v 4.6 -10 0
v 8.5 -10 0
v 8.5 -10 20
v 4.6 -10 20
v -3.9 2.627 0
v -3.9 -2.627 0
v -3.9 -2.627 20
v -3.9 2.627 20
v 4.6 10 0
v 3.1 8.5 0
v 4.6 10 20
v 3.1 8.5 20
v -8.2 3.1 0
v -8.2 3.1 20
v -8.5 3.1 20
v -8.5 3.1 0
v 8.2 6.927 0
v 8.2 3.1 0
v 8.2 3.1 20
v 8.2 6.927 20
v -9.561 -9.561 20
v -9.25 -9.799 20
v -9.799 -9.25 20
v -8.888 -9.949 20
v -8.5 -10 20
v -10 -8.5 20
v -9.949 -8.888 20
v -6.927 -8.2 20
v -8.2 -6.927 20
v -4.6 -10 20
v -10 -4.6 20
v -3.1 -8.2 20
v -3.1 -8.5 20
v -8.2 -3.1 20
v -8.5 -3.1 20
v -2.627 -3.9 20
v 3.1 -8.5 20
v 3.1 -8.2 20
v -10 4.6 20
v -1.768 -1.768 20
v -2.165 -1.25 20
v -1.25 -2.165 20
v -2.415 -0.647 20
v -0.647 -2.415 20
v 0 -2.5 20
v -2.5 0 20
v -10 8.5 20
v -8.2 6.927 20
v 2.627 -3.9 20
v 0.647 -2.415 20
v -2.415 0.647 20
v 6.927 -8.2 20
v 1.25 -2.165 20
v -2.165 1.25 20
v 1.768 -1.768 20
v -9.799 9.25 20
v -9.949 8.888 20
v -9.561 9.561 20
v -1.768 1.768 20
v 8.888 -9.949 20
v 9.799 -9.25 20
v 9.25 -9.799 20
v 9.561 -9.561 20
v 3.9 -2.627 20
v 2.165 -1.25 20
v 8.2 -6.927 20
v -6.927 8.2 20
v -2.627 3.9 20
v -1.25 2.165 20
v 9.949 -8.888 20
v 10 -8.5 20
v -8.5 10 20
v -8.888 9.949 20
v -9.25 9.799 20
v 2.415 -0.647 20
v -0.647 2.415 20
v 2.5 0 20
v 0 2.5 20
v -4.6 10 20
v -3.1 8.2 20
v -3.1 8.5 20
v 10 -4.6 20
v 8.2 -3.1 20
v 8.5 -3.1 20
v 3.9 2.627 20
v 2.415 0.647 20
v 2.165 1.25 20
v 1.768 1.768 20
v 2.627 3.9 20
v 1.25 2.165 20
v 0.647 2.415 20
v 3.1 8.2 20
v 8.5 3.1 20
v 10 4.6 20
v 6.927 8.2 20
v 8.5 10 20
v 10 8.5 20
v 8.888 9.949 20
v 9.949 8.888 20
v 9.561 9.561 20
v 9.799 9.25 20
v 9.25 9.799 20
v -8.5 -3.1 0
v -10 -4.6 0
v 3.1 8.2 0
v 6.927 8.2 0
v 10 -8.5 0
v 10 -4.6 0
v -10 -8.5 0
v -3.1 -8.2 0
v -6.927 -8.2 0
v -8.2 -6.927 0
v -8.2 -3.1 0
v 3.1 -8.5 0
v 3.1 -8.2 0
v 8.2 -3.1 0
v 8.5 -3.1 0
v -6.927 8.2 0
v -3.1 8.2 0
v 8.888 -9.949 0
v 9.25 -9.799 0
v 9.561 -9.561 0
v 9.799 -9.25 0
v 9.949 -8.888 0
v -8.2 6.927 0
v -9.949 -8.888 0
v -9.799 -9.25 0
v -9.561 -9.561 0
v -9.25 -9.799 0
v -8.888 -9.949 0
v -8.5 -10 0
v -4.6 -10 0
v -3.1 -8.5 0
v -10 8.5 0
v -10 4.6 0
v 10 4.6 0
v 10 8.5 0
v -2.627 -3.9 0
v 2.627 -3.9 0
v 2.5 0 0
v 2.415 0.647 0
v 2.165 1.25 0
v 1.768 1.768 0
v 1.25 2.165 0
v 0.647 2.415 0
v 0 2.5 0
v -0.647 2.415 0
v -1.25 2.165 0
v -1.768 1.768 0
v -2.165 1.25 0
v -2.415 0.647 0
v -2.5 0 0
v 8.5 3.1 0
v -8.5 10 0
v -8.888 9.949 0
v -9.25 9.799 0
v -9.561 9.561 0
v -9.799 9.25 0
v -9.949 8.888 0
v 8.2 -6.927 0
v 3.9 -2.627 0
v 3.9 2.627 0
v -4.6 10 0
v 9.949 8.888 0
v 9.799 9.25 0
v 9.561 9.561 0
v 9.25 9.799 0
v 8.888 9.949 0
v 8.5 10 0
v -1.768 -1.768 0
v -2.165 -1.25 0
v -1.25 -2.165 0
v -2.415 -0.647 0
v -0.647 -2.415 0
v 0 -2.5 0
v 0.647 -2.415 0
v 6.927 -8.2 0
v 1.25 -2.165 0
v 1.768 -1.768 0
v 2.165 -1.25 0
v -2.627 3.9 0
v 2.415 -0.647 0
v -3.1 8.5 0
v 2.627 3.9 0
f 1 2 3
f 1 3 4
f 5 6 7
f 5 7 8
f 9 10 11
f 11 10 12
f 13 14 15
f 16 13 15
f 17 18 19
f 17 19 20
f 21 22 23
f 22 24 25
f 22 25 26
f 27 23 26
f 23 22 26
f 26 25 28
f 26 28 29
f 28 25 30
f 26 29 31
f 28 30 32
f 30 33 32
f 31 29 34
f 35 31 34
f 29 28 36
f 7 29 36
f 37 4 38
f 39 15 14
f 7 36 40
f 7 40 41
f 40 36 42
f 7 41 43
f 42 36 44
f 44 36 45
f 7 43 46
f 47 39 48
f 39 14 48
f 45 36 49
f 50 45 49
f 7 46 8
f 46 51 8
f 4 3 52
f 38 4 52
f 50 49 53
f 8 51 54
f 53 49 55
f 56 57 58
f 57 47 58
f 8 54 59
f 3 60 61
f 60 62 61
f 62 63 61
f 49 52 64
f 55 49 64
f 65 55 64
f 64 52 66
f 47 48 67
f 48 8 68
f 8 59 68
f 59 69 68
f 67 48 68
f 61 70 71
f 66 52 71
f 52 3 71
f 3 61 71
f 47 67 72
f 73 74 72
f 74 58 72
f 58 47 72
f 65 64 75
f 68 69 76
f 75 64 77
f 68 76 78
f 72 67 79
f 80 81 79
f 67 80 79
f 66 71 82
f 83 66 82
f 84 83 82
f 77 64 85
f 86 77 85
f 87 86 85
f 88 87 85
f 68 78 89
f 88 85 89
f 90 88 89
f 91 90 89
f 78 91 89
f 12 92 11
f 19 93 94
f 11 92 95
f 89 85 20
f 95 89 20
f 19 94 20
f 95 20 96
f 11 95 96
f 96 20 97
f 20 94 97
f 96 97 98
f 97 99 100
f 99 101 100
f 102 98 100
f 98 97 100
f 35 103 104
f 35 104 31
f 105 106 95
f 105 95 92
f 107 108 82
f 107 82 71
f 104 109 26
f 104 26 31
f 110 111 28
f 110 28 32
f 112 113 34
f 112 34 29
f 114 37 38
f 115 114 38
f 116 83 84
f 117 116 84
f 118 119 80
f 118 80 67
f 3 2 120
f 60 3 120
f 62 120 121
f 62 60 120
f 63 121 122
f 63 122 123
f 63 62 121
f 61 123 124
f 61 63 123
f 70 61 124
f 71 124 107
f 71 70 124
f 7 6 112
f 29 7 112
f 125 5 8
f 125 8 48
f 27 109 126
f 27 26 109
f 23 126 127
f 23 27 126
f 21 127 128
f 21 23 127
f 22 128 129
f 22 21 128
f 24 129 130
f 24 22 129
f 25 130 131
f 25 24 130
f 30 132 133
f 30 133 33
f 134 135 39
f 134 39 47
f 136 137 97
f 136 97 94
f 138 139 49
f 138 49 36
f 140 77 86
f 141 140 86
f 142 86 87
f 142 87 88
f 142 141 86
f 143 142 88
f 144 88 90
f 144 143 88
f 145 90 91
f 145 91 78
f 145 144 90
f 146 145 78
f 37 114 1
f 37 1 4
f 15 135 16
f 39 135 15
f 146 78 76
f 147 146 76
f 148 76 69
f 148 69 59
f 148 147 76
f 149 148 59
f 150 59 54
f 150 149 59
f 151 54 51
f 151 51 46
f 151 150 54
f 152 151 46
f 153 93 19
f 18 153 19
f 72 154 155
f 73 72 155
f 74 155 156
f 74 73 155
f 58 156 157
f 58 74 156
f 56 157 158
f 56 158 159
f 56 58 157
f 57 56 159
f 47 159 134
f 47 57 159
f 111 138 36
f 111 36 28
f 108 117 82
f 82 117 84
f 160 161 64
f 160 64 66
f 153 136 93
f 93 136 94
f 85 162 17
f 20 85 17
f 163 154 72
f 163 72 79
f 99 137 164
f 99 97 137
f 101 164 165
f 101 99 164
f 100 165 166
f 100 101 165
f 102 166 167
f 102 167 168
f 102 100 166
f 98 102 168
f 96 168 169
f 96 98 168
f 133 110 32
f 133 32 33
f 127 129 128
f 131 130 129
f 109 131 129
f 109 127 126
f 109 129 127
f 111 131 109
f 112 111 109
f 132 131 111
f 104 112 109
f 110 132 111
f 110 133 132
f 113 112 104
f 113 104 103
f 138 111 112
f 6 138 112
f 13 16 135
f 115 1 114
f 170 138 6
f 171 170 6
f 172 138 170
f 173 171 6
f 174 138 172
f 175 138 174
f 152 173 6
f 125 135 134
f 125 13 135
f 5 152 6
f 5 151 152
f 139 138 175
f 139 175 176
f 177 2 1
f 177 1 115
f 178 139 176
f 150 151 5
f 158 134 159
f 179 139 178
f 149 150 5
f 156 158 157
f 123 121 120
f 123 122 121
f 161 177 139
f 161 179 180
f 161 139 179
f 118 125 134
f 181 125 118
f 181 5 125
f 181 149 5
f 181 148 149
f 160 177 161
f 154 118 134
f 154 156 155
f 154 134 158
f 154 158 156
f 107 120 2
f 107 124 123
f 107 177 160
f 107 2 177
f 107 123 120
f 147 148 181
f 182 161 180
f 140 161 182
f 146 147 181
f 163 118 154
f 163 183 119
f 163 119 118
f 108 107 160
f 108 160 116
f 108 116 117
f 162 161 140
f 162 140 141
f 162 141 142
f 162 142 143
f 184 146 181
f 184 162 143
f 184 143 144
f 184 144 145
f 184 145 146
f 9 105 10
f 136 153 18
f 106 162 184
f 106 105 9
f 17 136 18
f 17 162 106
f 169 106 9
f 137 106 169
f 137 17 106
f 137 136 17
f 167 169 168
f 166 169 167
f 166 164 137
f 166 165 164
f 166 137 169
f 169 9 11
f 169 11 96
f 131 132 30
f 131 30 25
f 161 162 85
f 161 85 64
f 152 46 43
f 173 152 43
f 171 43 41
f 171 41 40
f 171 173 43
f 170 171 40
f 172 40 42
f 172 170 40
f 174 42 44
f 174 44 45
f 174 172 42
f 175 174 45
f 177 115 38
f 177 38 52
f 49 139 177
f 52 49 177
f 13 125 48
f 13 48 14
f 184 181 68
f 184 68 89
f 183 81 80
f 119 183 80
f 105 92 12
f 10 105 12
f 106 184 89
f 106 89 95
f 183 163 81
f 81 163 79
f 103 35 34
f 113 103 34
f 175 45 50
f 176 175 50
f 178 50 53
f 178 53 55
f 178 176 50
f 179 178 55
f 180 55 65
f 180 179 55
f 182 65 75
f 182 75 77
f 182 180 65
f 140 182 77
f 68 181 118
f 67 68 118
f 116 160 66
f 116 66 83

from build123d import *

# Parameters (mm, degrees)
PAD_DEPTH            = 20
POLARPATTERN_COUNT   = 4
FILLET_R             = 1.5
CHAMFER_SIZE         = 1.5
BODY_PLACEMENT_ANGLE = 270


with BuildPart() as part:
    # Sketch → Pad (new body)
    with BuildSketch(Plane.XZ):
        with BuildLine():
            Line((0, 3.9), (2.627208, 3.9))
            Line((2.627208, 3.9), (6.927208, 8.2))
            Line((6.927208, 8.2), (3.1, 8.2))
            Line((3.1, 8.2), (3.1, 10))
            Line((3.1, 10), (10, 10))
            Line((10, 10), (10, 3.1))
            Line((10, 3.1), (8.2, 3.1))
            Line((8.2, 3.1), (8.2, 6.927208))
            Line((3.9, 2.627208), (8.2, 6.927208))
            Line((3.9, 2.627208), (3.9, 0))
            Line((2.5, 0), (3.9, 0))
            ThreePointArc((2.5, 0), (1.767767, 1.767767), (0, 2.5))
            Line((0, 3.9), (0, 2.5))
        make_face()
    pad = extrude(amount=PAD_DEPTH)

    # PolarPattern: Pad ×4 about axis
    polarpattern_axis = Axis((0, 0, 0), (0, -1, 0))
    for i in range(1, POLARPATTERN_COUNT):
        add(pad.rotate(polarpattern_axis, i * 360 / POLARPATTERN_COUNT))

    # Fillet
    fillet_edges = [part.edges().sort_by_distance(p)[0] for p in [
        (-10, -10, 10),
        (10, -10, 10),
        (10, -10, -10),
        (-10, -10, -10),
    ]]
    fillet(fillet_edges, radius=FILLET_R)

    # Chamfer
    chamfer_edges = [part.edges().sort_by_distance(p)[0] for p in [
        (3.1, -10, 10),
        (-3.1, -10, 10),
        (-10, -10, 3.1),
        (-10, -10, -3.1),
        (-3.1, -10, -10),
        (10, -10, -3.1),
        (3.1, -10, -10),
        (10, -10, 3.1),
    ]]
    chamfer(chamfer_edges, length=CHAMFER_SIZE)


with BuildPart() as part_1:
    # Body placement: moved
    add(part.part.rotate(Axis((0, 0, 0), (1, 0, 0)), BODY_PLACEMENT_ANGLE))


solid = part_1.part
